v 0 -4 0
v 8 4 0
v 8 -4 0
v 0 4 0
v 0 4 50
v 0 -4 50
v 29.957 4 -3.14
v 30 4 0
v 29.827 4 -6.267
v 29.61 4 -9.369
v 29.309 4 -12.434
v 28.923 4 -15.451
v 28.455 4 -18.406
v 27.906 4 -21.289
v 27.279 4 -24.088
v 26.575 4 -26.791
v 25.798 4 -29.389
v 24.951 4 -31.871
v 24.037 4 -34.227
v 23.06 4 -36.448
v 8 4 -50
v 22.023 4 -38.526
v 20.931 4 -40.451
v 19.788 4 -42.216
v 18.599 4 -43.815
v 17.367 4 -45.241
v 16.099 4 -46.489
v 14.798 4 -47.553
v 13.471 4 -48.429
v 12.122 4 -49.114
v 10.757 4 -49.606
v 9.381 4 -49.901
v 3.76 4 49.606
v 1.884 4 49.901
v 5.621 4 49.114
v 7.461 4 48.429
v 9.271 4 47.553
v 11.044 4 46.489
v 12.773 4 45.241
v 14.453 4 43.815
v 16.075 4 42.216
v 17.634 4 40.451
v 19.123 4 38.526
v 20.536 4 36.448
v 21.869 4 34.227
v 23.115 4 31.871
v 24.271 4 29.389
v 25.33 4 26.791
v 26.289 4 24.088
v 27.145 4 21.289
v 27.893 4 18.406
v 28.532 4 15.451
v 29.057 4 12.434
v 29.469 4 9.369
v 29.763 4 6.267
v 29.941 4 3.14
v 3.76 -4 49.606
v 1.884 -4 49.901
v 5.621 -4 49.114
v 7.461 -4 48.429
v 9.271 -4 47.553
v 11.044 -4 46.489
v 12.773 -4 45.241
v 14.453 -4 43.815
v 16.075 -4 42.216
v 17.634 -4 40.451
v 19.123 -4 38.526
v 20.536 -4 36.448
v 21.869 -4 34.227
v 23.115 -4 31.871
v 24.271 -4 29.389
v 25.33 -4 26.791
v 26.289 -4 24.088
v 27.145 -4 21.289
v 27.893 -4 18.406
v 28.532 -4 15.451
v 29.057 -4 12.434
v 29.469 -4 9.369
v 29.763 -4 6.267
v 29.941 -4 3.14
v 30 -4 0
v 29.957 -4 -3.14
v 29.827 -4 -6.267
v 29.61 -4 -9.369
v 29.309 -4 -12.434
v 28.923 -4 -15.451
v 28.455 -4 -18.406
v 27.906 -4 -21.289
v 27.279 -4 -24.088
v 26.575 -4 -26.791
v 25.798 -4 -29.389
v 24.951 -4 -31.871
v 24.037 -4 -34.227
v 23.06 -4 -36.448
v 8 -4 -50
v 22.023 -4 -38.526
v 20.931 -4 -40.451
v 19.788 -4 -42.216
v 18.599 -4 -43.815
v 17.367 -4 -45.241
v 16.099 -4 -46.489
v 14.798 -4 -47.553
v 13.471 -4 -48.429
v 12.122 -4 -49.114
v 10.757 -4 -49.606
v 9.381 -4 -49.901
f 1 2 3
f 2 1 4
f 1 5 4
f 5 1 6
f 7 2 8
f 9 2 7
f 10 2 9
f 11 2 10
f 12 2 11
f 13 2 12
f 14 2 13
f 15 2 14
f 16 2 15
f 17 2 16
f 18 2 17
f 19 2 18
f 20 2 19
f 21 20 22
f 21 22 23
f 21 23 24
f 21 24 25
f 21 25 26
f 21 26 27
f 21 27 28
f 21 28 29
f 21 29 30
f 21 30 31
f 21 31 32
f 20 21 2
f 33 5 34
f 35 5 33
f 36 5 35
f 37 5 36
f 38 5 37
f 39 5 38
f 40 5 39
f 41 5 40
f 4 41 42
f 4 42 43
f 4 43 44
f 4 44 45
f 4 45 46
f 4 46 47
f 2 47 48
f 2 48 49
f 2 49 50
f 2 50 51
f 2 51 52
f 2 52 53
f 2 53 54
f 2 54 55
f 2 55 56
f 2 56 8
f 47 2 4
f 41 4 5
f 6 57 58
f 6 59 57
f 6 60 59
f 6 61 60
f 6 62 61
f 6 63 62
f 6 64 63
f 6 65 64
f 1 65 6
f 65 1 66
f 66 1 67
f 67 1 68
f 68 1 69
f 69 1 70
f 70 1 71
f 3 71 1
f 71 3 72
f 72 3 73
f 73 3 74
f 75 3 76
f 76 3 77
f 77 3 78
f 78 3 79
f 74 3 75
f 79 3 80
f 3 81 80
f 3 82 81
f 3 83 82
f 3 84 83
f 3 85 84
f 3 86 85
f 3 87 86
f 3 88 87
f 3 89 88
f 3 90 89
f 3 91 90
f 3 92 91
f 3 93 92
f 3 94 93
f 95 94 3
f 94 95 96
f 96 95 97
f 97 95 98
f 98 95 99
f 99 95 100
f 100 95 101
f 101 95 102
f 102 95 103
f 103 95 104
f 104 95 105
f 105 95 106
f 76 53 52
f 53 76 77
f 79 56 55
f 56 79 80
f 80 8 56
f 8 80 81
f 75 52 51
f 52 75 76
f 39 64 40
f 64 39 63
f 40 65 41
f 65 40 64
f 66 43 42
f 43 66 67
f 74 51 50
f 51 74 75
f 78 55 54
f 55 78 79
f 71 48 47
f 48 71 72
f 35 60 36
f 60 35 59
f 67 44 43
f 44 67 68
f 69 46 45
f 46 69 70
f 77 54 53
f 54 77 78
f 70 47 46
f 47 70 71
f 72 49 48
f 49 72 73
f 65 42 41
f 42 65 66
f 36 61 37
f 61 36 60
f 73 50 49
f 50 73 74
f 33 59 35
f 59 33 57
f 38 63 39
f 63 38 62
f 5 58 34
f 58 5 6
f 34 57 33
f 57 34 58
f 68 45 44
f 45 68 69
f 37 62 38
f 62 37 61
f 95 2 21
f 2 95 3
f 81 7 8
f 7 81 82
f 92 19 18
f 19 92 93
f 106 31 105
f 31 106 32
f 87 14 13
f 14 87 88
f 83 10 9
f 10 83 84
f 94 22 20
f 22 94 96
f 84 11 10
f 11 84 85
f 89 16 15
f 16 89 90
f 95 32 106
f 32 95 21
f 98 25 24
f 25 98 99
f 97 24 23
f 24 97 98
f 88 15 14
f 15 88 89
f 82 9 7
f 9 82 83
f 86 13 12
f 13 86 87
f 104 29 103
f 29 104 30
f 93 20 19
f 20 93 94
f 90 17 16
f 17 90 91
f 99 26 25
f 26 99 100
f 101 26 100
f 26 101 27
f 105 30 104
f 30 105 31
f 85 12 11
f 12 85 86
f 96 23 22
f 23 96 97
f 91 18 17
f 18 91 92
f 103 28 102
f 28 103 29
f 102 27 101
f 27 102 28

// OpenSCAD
// file: global.scad
// all measures in mm

$fn = 100;
nothing = 0.01;

material_x = 510;
material_y = 370;
material_width = 8;

leg_x = 450;
leg_z = 950;

// about hoch much the faces in Y direction are inset
face_y_inset = 30;

// how far the joint extends planarly from the face
joint_x = 30;

// Assume same material measure as for X plane
leg_y = leg_x - joint_x*2;

// the lateral width of the joint
joint_y = 50;
// how far down the hook extends
joint_hook_y = 50;

joint_total_height = joint_y + joint_hook_y;

num_joints = 4;
q = leg_z/(num_joints+1);
joint_height = [q, 2*q, 3*q, 4*q];

nose_width = 100;
nose_z = material_width;

// how far apart from on another to project the parts
projection_spacing = 1;
// main file
include <global.scad>;

module joint()
{
    // center in y-direction
    translate([
        0,
        -material_width/2,
        0
        ])
    {
        // main support structure
        intersection()
        {
            cube([
                joint_x,
                material_width,
                joint_y
                ]);

            scale([
                joint_x,
                material_width,
                joint_y
                ])
            rotate([90, 0, 0])
            cylinder(r=1, h=2, center=true);
        }

        // add hook
        translate([
            material_width,
            0,
            0
            ])
        mirror([0, 0, 1])
        intersection()
        {
            cube([
                joint_x - material_width,
                material_width,
                joint_hook_y
                ]);

            scale([
                joint_x - material_width,
                material_width,
                joint_hook_y
                ])
            rotate([90, 0, 0])
            cylinder(r=1, h=2, center=true);
        }
    }
}

joint();
